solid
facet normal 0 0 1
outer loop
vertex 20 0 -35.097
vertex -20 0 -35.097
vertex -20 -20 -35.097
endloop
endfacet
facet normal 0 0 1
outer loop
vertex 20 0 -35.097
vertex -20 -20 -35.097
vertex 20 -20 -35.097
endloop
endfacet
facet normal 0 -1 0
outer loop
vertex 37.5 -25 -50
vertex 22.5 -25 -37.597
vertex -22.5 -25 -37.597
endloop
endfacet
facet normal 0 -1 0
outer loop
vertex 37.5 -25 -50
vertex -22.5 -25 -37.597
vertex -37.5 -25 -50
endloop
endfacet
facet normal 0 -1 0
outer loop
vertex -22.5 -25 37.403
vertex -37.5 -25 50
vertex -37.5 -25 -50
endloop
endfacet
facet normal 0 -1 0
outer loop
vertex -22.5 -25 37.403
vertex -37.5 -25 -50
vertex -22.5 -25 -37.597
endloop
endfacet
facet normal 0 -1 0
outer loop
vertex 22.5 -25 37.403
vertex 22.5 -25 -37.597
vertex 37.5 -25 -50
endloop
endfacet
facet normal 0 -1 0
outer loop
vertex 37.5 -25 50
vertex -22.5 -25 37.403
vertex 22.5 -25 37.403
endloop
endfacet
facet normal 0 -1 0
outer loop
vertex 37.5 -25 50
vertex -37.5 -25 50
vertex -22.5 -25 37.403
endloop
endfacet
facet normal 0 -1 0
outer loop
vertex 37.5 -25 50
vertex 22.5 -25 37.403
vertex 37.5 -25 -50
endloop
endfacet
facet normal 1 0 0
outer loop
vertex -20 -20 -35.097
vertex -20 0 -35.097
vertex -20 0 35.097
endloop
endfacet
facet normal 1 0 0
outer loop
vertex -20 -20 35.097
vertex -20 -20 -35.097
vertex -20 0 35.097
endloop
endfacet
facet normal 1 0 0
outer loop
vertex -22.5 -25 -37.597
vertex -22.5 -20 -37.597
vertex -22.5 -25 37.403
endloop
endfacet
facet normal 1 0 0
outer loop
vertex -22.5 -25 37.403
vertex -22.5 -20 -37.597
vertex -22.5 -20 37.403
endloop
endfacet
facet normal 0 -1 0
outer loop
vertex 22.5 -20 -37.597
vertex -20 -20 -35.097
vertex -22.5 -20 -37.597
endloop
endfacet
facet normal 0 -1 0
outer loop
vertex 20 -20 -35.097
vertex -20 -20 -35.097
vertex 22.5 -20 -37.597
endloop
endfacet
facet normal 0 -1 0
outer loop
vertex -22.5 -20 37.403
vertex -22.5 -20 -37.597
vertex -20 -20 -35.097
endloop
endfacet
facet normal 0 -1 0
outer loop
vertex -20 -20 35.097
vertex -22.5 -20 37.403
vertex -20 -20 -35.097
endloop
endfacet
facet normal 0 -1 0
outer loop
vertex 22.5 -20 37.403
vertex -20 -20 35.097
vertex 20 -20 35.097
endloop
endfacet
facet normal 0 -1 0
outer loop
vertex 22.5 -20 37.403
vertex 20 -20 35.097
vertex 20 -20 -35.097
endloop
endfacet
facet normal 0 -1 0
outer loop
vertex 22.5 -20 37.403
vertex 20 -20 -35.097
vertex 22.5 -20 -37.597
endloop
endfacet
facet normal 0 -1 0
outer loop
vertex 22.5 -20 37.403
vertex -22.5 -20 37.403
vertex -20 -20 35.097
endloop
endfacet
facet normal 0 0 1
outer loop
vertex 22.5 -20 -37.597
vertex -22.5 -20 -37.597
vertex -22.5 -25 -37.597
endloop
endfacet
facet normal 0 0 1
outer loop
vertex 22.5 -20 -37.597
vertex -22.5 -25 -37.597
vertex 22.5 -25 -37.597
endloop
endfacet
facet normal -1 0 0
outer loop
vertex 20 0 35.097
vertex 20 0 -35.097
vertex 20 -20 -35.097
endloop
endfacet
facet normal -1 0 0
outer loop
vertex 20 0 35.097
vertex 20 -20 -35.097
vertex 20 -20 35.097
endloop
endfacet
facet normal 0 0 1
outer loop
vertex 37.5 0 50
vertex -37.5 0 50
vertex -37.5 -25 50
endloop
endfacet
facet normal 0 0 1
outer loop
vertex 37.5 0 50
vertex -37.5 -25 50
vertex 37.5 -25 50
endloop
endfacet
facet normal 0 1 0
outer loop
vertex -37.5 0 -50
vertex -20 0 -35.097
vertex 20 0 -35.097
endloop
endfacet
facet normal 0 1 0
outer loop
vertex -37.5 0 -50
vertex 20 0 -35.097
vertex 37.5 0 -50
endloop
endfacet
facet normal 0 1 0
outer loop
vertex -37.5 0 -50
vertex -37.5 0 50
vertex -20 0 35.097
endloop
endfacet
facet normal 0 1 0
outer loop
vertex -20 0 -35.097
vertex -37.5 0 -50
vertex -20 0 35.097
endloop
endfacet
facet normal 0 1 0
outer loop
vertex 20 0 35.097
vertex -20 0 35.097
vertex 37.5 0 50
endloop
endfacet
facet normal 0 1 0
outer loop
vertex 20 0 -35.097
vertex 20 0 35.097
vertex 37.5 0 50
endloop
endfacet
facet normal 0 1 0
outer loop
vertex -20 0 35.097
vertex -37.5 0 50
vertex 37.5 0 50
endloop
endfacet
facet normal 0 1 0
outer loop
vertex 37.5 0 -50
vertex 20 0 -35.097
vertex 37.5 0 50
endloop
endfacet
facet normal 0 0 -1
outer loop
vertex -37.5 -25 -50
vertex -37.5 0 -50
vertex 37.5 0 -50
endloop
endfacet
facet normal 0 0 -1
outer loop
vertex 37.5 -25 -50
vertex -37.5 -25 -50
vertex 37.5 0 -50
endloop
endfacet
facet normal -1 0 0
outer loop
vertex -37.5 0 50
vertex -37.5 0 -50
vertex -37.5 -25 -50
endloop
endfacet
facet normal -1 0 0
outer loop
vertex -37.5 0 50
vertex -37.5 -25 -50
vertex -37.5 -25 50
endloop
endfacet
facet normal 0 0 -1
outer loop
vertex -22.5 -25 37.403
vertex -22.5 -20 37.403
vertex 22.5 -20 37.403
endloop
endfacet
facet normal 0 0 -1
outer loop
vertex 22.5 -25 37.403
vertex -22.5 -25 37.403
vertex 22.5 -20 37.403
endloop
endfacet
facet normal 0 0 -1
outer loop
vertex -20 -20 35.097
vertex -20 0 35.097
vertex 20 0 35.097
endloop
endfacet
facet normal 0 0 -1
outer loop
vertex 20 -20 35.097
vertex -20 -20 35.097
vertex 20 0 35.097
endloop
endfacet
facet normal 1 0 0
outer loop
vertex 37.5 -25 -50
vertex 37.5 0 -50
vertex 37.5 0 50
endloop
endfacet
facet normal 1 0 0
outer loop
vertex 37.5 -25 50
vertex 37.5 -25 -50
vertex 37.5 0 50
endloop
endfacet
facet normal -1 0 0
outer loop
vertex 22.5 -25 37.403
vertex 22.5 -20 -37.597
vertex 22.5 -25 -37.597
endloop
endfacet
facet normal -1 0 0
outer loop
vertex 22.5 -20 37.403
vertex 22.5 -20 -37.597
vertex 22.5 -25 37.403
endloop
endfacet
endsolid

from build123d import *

# Parameters (mm, degrees)
F1_W     = 45
F1_H     = 75
F1_W_2   = 40
F1_H_2   = 70.19363
F3_DEPTH = 20
F2_W     = 75
F2_H     = 100
F2_W_2   = 45
F2_H_2   = 75
F4_DEPTH = 25


with BuildPart() as f3:
    # F1 (on face) → F3 (new body)
    with BuildSketch(Plane.XZ):
        with Locations((0, -0.096815)):
            Rectangle(F1_W, F1_H)
        Rectangle(F1_W_2, F1_H_2, mode=Mode.SUBTRACT)
    extrude(amount=F3_DEPTH)

    # F2 (on face) → F4 (join)
    with BuildSketch(Plane.XZ):
        Rectangle(F2_W, F2_H)
        with Locations((0, -0.096815)):
            Rectangle(F2_W_2, F2_H_2, mode=Mode.SUBTRACT)
    extrude(amount=F4_DEPTH)


solid = f3.part
